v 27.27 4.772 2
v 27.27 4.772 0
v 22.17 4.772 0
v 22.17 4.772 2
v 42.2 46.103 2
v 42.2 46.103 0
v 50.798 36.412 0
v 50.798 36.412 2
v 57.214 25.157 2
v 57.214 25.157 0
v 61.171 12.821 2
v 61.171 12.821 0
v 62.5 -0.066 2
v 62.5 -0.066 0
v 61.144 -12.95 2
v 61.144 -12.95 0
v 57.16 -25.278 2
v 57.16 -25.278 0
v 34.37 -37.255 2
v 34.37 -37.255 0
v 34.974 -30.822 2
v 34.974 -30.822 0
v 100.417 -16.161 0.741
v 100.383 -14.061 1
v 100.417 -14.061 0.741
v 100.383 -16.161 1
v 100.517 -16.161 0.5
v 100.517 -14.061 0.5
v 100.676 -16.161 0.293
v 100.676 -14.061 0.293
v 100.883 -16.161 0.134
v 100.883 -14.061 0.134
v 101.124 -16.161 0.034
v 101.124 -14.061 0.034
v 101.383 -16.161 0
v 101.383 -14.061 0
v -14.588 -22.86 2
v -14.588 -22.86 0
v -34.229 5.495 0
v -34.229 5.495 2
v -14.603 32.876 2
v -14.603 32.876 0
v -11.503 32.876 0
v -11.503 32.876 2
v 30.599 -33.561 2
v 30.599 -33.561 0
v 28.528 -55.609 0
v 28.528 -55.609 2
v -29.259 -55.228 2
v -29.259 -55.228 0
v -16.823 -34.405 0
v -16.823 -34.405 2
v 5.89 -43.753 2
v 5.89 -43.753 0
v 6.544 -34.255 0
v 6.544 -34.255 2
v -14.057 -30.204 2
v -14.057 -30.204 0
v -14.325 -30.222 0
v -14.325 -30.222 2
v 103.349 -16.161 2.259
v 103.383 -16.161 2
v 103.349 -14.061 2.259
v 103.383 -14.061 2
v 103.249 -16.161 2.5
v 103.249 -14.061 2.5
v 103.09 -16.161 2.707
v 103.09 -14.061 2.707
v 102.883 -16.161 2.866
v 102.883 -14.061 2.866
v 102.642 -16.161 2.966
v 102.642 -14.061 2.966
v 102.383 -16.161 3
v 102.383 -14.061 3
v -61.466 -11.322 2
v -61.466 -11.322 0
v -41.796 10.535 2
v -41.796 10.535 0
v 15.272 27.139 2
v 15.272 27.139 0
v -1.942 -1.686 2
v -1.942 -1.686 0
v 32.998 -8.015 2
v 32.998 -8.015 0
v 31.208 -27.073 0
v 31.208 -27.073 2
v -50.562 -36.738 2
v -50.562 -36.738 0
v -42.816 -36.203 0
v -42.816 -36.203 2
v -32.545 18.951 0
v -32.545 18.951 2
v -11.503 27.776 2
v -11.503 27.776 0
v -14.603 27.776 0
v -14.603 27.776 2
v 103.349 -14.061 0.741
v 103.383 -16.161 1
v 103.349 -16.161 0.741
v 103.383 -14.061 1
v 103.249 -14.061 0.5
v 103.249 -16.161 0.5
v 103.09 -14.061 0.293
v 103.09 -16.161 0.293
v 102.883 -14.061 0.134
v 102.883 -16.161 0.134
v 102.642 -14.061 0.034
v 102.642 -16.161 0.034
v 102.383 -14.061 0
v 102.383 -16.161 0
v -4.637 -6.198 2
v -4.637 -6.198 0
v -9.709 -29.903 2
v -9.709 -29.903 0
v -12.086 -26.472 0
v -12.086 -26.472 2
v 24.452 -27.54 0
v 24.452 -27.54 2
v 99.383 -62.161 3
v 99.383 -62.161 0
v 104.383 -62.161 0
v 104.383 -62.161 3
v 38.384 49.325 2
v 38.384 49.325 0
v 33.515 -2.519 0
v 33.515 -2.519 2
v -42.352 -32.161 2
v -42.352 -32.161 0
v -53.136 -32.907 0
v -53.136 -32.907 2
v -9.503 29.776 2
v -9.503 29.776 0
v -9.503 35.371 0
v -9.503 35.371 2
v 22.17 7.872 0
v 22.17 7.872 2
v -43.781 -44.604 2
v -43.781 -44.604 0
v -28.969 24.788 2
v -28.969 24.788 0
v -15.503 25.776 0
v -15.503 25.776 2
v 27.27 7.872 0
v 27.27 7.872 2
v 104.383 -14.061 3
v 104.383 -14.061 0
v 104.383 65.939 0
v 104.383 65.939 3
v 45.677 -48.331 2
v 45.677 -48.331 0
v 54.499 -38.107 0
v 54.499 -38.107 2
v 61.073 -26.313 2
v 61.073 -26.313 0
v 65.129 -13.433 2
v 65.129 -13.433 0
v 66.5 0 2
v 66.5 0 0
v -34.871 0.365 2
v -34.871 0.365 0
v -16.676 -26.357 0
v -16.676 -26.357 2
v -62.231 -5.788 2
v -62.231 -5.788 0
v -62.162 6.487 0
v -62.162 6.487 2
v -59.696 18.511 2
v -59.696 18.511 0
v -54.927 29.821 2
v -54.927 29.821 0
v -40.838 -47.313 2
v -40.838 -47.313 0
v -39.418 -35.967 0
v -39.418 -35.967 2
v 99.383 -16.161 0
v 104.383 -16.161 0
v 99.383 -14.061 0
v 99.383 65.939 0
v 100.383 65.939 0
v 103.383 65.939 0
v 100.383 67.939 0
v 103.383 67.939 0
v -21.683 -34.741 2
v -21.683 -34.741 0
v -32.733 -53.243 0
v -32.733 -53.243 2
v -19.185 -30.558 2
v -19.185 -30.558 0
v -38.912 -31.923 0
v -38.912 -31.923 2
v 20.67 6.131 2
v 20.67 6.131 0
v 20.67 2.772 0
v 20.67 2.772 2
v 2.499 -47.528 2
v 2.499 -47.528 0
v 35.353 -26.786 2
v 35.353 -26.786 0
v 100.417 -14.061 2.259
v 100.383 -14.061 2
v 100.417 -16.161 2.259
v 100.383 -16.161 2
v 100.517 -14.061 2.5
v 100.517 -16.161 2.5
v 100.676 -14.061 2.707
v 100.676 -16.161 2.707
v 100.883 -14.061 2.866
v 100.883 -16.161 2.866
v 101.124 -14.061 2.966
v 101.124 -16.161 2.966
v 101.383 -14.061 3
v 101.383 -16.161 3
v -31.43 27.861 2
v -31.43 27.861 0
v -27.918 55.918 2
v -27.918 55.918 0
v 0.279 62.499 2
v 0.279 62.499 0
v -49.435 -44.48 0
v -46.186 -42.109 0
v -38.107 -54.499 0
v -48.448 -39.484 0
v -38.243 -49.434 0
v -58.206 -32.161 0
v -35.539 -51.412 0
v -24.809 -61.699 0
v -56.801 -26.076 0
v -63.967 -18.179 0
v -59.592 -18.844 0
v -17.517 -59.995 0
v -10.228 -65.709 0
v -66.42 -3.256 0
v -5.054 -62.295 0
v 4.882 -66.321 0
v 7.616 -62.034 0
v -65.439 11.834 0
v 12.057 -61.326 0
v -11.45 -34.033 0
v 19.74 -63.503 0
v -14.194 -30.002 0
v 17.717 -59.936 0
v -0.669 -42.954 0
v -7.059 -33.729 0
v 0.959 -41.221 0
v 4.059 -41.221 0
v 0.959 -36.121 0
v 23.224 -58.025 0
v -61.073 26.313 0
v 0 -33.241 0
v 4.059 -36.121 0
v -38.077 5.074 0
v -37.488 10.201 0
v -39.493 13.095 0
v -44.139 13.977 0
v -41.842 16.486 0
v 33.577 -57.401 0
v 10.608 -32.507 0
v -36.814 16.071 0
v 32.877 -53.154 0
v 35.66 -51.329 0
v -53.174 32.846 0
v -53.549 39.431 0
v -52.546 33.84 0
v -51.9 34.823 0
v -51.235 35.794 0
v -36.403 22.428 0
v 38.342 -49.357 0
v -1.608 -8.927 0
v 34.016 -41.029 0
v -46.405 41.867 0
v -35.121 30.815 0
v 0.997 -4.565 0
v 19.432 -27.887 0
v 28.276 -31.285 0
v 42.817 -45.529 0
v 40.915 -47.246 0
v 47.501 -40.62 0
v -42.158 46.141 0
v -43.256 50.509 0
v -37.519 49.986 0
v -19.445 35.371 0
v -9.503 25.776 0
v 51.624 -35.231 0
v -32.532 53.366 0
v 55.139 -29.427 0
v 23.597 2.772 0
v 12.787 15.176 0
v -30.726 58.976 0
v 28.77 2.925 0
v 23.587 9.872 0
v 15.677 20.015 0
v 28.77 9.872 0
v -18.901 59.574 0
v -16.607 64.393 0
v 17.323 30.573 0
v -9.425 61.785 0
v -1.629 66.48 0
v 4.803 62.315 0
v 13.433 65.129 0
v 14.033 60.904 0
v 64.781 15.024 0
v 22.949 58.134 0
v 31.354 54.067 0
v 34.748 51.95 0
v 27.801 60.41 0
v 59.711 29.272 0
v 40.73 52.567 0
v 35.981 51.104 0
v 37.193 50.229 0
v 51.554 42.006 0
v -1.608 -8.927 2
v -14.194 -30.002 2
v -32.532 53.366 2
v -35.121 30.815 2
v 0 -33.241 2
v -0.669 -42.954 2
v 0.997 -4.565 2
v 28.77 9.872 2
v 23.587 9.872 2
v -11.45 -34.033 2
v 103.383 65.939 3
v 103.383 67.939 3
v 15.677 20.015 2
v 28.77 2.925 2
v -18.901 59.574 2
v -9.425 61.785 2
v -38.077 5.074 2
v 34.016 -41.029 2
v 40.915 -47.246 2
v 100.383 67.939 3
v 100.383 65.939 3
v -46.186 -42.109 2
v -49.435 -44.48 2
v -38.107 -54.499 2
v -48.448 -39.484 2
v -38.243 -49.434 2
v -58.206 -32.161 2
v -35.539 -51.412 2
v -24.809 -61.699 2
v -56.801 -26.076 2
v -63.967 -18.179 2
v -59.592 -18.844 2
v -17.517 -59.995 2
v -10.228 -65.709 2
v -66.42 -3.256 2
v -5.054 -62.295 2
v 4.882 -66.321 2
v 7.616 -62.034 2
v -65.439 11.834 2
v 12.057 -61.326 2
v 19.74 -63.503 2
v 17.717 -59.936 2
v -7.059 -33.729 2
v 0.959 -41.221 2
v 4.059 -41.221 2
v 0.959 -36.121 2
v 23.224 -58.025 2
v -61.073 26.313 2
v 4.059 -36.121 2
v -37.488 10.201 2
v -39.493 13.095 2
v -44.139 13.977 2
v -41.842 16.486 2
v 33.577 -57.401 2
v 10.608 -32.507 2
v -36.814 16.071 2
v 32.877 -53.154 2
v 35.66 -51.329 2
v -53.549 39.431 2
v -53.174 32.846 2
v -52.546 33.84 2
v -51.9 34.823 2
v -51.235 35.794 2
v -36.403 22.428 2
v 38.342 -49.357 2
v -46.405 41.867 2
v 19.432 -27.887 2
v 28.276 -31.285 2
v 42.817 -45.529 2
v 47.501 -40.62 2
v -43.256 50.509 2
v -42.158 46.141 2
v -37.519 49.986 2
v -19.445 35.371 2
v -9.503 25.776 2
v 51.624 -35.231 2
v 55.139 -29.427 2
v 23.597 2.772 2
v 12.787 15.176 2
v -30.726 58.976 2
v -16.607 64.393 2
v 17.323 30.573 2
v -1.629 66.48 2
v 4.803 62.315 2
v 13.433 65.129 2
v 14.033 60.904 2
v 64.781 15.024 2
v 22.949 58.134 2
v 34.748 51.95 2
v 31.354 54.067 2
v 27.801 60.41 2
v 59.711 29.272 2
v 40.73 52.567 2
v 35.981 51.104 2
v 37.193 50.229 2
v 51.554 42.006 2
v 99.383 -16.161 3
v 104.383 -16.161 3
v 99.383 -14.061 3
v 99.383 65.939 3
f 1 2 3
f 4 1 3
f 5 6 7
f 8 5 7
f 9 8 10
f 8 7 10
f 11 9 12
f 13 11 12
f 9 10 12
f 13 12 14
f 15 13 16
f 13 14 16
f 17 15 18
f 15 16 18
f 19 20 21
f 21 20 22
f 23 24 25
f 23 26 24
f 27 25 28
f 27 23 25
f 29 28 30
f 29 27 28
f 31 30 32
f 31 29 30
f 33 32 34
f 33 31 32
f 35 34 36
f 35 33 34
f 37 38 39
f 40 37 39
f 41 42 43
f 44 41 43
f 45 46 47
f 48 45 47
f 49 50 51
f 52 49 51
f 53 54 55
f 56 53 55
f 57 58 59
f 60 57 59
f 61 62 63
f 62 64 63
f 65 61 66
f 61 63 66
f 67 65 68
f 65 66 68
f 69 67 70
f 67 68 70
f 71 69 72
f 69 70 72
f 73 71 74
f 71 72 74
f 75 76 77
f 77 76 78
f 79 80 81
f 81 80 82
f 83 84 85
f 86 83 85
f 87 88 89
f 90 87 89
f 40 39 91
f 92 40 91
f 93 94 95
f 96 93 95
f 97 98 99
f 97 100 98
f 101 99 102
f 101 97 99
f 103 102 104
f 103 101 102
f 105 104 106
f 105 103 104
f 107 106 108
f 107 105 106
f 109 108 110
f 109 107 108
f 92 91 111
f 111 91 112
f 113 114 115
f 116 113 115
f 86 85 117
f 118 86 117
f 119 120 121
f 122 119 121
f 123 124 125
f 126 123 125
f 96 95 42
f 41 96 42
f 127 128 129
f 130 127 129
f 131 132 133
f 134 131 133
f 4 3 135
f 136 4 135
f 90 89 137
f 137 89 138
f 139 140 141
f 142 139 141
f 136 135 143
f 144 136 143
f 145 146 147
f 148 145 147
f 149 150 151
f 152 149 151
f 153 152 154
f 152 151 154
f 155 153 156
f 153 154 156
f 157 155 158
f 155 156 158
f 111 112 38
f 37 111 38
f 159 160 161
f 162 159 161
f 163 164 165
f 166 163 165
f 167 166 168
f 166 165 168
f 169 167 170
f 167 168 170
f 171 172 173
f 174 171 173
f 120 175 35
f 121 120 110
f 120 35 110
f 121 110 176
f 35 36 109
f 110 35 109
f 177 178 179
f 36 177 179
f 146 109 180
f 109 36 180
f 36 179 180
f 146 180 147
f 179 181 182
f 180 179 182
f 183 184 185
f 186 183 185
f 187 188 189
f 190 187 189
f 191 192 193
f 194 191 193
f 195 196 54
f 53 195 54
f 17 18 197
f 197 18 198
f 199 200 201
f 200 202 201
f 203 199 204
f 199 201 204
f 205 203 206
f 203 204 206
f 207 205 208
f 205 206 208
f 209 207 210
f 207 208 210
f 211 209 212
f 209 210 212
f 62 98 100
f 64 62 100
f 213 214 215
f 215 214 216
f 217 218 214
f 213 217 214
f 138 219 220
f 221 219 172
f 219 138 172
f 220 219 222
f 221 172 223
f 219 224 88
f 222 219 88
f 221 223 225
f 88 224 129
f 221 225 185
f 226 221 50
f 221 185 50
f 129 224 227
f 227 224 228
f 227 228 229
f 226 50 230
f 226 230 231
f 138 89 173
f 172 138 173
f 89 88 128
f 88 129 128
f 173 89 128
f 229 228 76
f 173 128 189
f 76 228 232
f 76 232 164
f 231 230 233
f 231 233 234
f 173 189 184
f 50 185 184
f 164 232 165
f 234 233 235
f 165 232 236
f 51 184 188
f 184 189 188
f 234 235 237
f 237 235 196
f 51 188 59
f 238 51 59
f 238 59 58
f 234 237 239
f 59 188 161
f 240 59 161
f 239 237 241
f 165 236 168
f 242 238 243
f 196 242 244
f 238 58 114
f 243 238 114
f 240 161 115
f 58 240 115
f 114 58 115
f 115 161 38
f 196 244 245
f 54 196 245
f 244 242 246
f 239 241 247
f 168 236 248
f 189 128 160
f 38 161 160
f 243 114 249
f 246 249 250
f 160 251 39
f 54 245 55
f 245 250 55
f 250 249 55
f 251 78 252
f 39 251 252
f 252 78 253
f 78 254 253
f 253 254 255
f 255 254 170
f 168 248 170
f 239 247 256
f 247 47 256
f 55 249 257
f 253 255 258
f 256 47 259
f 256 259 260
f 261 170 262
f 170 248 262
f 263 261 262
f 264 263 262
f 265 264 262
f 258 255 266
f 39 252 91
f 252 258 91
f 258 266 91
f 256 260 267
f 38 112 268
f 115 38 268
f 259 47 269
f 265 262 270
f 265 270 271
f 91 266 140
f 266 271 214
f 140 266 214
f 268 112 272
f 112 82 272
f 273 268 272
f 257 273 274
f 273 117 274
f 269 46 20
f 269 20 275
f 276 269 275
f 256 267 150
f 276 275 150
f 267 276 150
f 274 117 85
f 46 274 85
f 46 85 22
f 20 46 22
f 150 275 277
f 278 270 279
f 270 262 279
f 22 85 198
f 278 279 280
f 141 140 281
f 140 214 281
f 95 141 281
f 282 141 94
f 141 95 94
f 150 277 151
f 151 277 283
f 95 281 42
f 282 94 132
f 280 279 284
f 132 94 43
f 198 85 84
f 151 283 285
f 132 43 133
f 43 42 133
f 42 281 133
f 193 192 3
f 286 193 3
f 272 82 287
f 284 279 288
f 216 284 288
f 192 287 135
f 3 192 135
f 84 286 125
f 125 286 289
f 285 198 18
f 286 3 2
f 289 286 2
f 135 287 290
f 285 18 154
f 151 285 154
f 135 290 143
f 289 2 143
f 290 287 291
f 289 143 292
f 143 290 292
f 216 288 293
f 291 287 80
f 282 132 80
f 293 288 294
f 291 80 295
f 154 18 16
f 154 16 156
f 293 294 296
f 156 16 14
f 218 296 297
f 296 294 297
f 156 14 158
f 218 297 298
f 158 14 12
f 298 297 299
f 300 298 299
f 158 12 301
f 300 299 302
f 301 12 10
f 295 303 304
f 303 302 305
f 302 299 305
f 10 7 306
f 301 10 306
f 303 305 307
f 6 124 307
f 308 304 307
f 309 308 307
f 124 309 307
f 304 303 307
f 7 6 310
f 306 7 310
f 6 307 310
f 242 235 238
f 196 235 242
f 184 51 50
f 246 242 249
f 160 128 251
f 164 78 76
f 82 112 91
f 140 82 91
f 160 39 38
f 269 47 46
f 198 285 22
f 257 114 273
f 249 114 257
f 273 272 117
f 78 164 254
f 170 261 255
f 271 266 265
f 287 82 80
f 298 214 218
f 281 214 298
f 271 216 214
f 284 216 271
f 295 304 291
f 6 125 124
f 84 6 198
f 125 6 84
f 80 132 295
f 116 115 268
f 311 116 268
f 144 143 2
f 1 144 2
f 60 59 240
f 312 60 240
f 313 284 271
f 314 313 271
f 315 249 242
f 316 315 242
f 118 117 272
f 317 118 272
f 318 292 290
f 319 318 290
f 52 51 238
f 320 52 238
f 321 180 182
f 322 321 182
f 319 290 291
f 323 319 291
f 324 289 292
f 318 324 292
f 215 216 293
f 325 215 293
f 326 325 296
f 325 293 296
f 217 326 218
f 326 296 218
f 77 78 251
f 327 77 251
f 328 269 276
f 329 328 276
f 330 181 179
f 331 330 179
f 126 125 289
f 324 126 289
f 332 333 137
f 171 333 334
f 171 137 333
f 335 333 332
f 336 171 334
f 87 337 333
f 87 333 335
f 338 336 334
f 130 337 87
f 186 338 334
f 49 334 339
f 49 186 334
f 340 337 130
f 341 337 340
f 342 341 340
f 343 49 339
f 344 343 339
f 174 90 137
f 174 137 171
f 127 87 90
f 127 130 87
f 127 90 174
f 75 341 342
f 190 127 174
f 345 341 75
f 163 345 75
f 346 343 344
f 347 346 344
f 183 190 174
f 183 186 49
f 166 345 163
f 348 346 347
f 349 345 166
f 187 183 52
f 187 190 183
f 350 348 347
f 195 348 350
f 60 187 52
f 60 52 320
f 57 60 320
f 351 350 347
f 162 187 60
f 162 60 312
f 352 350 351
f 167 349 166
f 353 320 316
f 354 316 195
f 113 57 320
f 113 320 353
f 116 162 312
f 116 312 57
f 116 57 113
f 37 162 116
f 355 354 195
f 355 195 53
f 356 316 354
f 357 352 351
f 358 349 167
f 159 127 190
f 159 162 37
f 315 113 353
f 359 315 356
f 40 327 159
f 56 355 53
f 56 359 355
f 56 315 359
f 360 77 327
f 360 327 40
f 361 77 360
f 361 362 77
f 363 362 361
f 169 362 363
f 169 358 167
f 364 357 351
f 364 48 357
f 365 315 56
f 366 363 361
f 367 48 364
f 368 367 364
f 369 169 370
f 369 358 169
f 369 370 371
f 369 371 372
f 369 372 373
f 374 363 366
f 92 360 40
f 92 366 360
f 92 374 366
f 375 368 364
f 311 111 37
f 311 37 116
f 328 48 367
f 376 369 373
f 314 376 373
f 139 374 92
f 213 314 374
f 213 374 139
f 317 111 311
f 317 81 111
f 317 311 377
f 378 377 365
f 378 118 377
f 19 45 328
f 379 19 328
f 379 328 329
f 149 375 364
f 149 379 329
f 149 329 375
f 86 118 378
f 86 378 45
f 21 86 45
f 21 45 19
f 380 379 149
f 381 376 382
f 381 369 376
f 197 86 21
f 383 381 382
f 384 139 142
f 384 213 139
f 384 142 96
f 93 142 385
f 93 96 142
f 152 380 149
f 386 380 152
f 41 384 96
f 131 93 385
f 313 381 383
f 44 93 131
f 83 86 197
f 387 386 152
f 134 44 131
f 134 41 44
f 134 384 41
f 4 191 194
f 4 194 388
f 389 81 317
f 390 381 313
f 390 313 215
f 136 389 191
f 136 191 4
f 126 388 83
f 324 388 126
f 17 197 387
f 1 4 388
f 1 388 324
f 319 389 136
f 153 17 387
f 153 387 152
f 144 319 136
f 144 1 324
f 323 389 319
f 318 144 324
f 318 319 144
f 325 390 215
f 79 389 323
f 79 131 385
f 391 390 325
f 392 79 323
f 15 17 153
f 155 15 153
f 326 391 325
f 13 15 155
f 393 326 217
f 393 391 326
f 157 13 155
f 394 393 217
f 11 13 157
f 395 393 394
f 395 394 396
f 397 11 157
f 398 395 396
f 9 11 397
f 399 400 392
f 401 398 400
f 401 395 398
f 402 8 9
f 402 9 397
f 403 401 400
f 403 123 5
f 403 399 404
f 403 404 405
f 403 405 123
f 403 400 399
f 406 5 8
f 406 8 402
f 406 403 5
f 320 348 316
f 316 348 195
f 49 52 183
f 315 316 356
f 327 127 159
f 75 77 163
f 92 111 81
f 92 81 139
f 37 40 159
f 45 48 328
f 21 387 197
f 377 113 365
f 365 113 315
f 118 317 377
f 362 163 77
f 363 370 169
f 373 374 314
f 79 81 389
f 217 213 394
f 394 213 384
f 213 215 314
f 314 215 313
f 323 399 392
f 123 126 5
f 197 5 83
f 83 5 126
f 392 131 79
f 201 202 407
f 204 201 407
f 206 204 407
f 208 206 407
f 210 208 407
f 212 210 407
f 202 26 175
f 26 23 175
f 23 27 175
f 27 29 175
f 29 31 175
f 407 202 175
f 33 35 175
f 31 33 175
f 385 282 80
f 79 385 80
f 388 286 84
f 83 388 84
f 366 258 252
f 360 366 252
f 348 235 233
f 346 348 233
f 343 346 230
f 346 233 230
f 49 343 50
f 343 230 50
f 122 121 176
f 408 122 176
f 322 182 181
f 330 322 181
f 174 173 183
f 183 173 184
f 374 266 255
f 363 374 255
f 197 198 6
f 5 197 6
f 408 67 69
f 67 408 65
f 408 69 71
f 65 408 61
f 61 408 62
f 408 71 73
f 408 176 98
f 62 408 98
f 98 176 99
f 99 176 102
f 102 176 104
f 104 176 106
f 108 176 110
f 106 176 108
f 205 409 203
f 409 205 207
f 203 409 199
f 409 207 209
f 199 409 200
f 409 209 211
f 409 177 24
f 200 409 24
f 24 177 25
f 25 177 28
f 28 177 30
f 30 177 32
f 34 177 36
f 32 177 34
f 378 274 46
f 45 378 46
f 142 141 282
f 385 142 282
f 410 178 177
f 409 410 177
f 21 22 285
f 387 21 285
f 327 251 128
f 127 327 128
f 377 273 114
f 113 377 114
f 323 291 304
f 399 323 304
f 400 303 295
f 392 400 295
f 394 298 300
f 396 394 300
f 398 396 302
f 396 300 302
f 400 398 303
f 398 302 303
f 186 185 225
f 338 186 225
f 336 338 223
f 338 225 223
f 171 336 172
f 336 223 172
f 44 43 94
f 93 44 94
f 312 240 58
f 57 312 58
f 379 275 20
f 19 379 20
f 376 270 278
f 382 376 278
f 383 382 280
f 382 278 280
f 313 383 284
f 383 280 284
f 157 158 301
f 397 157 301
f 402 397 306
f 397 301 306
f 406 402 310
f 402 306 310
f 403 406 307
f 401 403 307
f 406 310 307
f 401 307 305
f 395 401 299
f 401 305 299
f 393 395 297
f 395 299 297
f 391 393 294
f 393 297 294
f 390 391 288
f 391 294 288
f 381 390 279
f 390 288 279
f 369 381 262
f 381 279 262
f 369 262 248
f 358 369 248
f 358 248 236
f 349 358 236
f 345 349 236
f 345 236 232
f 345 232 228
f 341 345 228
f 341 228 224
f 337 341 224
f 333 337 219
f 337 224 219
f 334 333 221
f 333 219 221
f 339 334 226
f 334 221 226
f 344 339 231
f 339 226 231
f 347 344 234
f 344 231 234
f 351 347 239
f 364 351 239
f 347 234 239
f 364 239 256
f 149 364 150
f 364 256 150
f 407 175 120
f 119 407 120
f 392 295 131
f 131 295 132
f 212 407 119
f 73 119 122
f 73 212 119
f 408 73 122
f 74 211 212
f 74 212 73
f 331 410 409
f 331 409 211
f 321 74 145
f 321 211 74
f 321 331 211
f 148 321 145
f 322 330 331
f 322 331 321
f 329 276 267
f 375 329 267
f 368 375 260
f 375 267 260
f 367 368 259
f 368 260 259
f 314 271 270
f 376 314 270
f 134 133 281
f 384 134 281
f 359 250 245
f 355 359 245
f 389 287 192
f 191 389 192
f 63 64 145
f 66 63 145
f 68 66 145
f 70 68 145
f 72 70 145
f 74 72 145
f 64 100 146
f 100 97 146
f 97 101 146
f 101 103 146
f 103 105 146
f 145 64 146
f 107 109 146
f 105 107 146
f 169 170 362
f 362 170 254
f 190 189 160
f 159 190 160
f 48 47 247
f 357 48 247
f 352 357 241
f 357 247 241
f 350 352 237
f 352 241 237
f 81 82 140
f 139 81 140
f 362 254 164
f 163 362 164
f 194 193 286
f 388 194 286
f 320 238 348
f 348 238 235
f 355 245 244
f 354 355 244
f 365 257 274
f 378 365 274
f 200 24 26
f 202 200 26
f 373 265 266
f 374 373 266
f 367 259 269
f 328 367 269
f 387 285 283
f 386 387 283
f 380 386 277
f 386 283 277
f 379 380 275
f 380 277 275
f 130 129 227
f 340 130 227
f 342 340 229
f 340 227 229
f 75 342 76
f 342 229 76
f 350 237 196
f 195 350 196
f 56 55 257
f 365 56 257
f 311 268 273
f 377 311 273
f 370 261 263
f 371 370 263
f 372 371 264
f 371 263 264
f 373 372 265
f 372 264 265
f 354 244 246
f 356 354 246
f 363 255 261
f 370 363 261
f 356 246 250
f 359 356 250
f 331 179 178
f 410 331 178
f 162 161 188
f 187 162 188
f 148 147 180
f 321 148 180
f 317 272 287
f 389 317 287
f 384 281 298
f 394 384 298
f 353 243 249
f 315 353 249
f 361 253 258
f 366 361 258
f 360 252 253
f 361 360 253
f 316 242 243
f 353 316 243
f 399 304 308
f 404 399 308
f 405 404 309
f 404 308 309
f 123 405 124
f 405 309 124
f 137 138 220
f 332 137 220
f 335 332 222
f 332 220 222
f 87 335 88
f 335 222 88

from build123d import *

# Parameters (mm, degrees)
F1_DEPTH = 2
F3_DEPTH = 3
F4_R     = 1


with BuildPart() as f1:
    # F0 (on Top) → F1 (new body)
    with BuildSketch(Plane.XY):
        with BuildLine():
            ThreePointArc((45.67717, -48.330592), (61.072833, -26.312718), (66.5, 0))
            ThreePointArc((66.5, 0), (-61.072833, 26.312718), (45.67717, -48.330592))
        make_face()
        with BuildLine():
            ThreePointArc((-43.780877, -44.603641), (-47.335242, -40.812067), (-50.562311, -36.738301))
            Line((-50.562311, -36.738301), (-42.816252, -36.20253))
            Line((-42.816252, -36.20253), (-43.780877, -44.603641))
        make_face(mode=Mode.SUBTRACT)
        with BuildLine():
            Line((-21.68285, -34.740797), (-32.732565, -53.243114))
            ThreePointArc((-32.732565, -53.243114), (-36.904467, -50.441157), (-40.837765, -47.313074))
            Line((-40.837765, -47.313074), (-39.417844, -35.967472))
            Line((-39.417844, -35.967472), (-21.68285, -34.740797))
        make_face(mode=Mode.SUBTRACT)
        with BuildLine():
            ThreePointArc((7.616283, -62.034202), (-11.343846, -61.461916), (-29.259066, -55.228227))
            Line((-29.259066, -55.228227), (-16.823085, -34.404662))
            Line((-16.823085, -34.404662), (-11.449525, -34.032989))
            Line((-11.449525, -34.032989), (7.616283, -62.034202))
        make_face(mode=Mode.SUBTRACT)
        Polygon((-0.668951, -42.954418), (-7.058937, -33.729305), (0, -33.24106), align=None, mode=Mode.SUBTRACT)
        with BuildLine():
            Line((-42.352184, -32.160875), (-53.135646, -32.906734))
            ThreePointArc((-53.135646, -32.906734), (-58.308309, -22.503136), (-61.465967, -11.321879))
            Line((-61.465967, -11.321879), (-41.795781, 10.535383))
            Line((-41.795781, 10.535383), (-38.076881, 5.073577))
            Line((-38.076881, 5.073577), (-42.352184, -32.160875))
        make_face(mode=Mode.SUBTRACT)
        Polygon((-14.05681, -30.20377), (-14.325376, -30.222346), (-14.193975, -30.002321), align=None, mode=Mode.SUBTRACT)
        Polygon((-19.185142, -30.558481), (-38.91166, -31.922904), (-34.870787, 0.364911), (-16.676015, -26.357046), align=None, mode=Mode.SUBTRACT)
        Polygon((-32.544699, 18.951066), (-4.636751, -6.197768), (-14.587673, -22.860198), (-34.228717, 5.495242), align=None, mode=Mode.SUBTRACT)
        with BuildLine():
            ThreePointArc((28.528164, -55.609297), (20.492711, -59.044888), (12.056602, -61.326082))
            Line((12.056602, -61.326082), (2.498833, -47.527694))
            Line((2.498833, -47.527694), (5.88985, -43.752815))
            Line((5.88985, -43.752815), (6.543981, -34.254646))
            Line((6.543981, -34.254646), (10.608449, -32.507306))
            Line((10.608449, -32.507306), (28.275834, -31.285307))
            Line((28.275834, -31.285307), (30.599067, -33.561005))
            Line((30.599067, -33.561005), (28.528164, -55.609297))
        make_face(mode=Mode.SUBTRACT)
        Polygon((4.059471, -41.221074), (0.959471, -41.221074), (0.959471, -37.121074), (0.959471, -36.121074), (4.059471, -36.121074), (4.059471, -37.121074), align=None, mode=Mode.SUBTRACT)
        with BuildLine():
            ThreePointArc((40.915139, -47.246179), (37.014038, -50.360808), (32.876809, -53.154166))
            Line((32.876809, -53.154166), (34.01569, -41.028843))
            Line((34.01569, -41.028843), (40.915139, -47.246179))
        make_face(mode=Mode.SUBTRACT)
        with BuildLine():
            ThreePointArc((55.138781, -29.42728), (49.635394, -37.98128), (42.817399, -45.529335))
            Line((42.817399, -45.529335), (34.370157, -37.254934))
            Line((34.370157, -37.254934), (34.974377, -30.82199))
            Line((34.974377, -30.82199), (55.138781, -29.42728))
        make_face(mode=Mode.SUBTRACT)
        Polygon((-1.6078, -8.927261), (19.4325, -27.887417), (-9.70927, -29.903064), (-12.08575, -26.47218), align=None, mode=Mode.SUBTRACT)
        Polygon((32.998498, -8.014978), (31.208467, -27.072909), (24.452496, -27.540199), (0.997375, -4.564996), (12.786862, 15.17604), (20.669769, 6.13112), (20.669769, 2.772164), (23.597196, 2.772164), align=None, mode=Mode.SUBTRACT)
        with BuildLine():
            ThreePointArc((-62.231444, -5.787693), (-61.225117, 12.559263), (-54.927004, 29.820701))
            Line((-54.927004, 29.820701), (-44.139021, 13.976808))
            Line((-44.139021, 13.976808), (-62.231444, -5.787693))
        make_face(mode=Mode.SUBTRACT)
        Polygon((-37.488162, 10.200846), (-39.492612, 13.094637), (-36.814154, 16.070904), align=None, mode=Mode.SUBTRACT)
        with BuildLine():
            Line((-41.841885, 16.486242), (-53.17351, 32.845515))
            ThreePointArc((-53.17351, 32.845515), (-52.225202, 34.33334), (-51.235277, 35.793804))
            Line((-51.235277, 35.793804), (-36.402932, 22.427856))
            Line((-36.402932, 22.427856), (-41.841885, 16.486242))
        make_face(mode=Mode.SUBTRACT)
        Polygon((15.272228, 27.139041), (-1.942095, -1.685671), (-28.969051, 24.788284), (-15.503333, 25.775585), (-9.503333, 25.775585), align=None, mode=Mode.SUBTRACT)
        Polygon((-11.503333, 27.775585), (-14.603333, 27.775585), (-14.603333, 31.875585), (-14.603333, 32.875585), (-11.503333, 32.875585), (-11.503333, 31.875585), align=None, mode=Mode.SUBTRACT)
        with BuildLine():
            ThreePointArc((-46.40466, 41.867141), (-39.884841, 48.119117), (-32.531892, 53.365963))
            Line((-32.531892, 53.365963), (-35.121264, 30.814616))
            Line((-35.121264, 30.814616), (-46.40466, 41.867141))
        make_face(mode=Mode.SUBTRACT)
        with BuildLine():
            Line((-31.429633, 27.860781), (-27.918226, 55.917999))
            ThreePointArc((-27.918226, 55.917999), (-14.206221, 60.864056), (0.278538, 62.499379))
            Line((0.278538, 62.499379), (-31.429633, 27.860781))
        make_face(mode=Mode.SUBTRACT)
        Polygon((22.169769, 7.872164), (22.669769, 7.872164), (26.769769, 7.872164), (27.269769, 7.872164), (27.269769, 4.772164), (26.769769, 4.772164), (22.669769, 4.772164), (22.169769, 4.772164), align=None, mode=Mode.SUBTRACT)
        with BuildLine():
            ThreePointArc((34.748479, 51.949911), (36.589872, 50.669826), (38.384156, 49.324503))
            Line((38.384156, 49.324503), (33.514695, -2.519183))
            Line((33.514695, -2.519183), (28.769769, 2.925189))
            Line((28.769769, 2.925189), (28.769769, 9.872164))
            Line((28.769769, 9.872164), (23.58681, 9.872164))
            Line((23.58681, 9.872164), (15.676968, 20.01541))
            Line((15.676968, 20.01541), (34.748479, 51.949911))
        make_face(mode=Mode.SUBTRACT)
        with BuildLine():
            ThreePointArc((42.199577, 46.102556), (61.170902, 12.820715), (57.1601, -25.277914))
            Line((57.1601, -25.277914), (35.35344, -26.786214))
            Line((35.35344, -26.786214), (42.199577, 46.102556))
        make_face(mode=Mode.SUBTRACT)
        with BuildLine():
            ThreePointArc((4.802843, 62.315188), (18.542692, 59.686), (31.353587, 54.06665))
            Line((31.353587, 54.06665), (17.323154, 30.573237))
            Line((17.323154, 30.573237), (-9.503333, 29.775585))
            Line((-9.503333, 29.775585), (-9.503333, 35.370889))
            Line((-9.503333, 35.370889), (-19.445361, 35.370889))
            Line((-19.445361, 35.370889), (4.802843, 62.315188))
        make_face(mode=Mode.SUBTRACT)
    extrude(amount=F1_DEPTH)


with BuildPart() as f3:
    # F2 (on Top) → F3 (new body)
    with BuildSketch(Plane.XY):
        Polygon((103.382982, 67.939314), (100.382982, 67.939314), (100.382982, 65.939314), (99.382982, 65.939314), (99.382982, -14.060686), (100.382982, -14.060686), (100.382982, -16.160686), (99.382982, -16.160686), (99.382982, -62.160686), (100.382982, -62.160686), (103.382982, -62.160686), (104.382982, -62.160686), (104.382982, -16.160686), (103.382982, -16.160686), (103.382982, -14.060686), (104.382982, -14.060686), (104.382982, 65.939314), (103.382982, 65.939314), align=None)
    extrude(amount=F3_DEPTH)

    # F4
    f4_edges = [f3.edges().sort_by_distance(p)[0] for p in [
        (103.382982, -15.110686, 3),
        (100.382982, -15.110686, 3),
        (103.382982, -15.110686, 0),
        (100.382982, -15.110686, 0),
    ]]
    fillet(f4_edges, radius=F4_R)


solid = Compound([f1.part, f3.part])
